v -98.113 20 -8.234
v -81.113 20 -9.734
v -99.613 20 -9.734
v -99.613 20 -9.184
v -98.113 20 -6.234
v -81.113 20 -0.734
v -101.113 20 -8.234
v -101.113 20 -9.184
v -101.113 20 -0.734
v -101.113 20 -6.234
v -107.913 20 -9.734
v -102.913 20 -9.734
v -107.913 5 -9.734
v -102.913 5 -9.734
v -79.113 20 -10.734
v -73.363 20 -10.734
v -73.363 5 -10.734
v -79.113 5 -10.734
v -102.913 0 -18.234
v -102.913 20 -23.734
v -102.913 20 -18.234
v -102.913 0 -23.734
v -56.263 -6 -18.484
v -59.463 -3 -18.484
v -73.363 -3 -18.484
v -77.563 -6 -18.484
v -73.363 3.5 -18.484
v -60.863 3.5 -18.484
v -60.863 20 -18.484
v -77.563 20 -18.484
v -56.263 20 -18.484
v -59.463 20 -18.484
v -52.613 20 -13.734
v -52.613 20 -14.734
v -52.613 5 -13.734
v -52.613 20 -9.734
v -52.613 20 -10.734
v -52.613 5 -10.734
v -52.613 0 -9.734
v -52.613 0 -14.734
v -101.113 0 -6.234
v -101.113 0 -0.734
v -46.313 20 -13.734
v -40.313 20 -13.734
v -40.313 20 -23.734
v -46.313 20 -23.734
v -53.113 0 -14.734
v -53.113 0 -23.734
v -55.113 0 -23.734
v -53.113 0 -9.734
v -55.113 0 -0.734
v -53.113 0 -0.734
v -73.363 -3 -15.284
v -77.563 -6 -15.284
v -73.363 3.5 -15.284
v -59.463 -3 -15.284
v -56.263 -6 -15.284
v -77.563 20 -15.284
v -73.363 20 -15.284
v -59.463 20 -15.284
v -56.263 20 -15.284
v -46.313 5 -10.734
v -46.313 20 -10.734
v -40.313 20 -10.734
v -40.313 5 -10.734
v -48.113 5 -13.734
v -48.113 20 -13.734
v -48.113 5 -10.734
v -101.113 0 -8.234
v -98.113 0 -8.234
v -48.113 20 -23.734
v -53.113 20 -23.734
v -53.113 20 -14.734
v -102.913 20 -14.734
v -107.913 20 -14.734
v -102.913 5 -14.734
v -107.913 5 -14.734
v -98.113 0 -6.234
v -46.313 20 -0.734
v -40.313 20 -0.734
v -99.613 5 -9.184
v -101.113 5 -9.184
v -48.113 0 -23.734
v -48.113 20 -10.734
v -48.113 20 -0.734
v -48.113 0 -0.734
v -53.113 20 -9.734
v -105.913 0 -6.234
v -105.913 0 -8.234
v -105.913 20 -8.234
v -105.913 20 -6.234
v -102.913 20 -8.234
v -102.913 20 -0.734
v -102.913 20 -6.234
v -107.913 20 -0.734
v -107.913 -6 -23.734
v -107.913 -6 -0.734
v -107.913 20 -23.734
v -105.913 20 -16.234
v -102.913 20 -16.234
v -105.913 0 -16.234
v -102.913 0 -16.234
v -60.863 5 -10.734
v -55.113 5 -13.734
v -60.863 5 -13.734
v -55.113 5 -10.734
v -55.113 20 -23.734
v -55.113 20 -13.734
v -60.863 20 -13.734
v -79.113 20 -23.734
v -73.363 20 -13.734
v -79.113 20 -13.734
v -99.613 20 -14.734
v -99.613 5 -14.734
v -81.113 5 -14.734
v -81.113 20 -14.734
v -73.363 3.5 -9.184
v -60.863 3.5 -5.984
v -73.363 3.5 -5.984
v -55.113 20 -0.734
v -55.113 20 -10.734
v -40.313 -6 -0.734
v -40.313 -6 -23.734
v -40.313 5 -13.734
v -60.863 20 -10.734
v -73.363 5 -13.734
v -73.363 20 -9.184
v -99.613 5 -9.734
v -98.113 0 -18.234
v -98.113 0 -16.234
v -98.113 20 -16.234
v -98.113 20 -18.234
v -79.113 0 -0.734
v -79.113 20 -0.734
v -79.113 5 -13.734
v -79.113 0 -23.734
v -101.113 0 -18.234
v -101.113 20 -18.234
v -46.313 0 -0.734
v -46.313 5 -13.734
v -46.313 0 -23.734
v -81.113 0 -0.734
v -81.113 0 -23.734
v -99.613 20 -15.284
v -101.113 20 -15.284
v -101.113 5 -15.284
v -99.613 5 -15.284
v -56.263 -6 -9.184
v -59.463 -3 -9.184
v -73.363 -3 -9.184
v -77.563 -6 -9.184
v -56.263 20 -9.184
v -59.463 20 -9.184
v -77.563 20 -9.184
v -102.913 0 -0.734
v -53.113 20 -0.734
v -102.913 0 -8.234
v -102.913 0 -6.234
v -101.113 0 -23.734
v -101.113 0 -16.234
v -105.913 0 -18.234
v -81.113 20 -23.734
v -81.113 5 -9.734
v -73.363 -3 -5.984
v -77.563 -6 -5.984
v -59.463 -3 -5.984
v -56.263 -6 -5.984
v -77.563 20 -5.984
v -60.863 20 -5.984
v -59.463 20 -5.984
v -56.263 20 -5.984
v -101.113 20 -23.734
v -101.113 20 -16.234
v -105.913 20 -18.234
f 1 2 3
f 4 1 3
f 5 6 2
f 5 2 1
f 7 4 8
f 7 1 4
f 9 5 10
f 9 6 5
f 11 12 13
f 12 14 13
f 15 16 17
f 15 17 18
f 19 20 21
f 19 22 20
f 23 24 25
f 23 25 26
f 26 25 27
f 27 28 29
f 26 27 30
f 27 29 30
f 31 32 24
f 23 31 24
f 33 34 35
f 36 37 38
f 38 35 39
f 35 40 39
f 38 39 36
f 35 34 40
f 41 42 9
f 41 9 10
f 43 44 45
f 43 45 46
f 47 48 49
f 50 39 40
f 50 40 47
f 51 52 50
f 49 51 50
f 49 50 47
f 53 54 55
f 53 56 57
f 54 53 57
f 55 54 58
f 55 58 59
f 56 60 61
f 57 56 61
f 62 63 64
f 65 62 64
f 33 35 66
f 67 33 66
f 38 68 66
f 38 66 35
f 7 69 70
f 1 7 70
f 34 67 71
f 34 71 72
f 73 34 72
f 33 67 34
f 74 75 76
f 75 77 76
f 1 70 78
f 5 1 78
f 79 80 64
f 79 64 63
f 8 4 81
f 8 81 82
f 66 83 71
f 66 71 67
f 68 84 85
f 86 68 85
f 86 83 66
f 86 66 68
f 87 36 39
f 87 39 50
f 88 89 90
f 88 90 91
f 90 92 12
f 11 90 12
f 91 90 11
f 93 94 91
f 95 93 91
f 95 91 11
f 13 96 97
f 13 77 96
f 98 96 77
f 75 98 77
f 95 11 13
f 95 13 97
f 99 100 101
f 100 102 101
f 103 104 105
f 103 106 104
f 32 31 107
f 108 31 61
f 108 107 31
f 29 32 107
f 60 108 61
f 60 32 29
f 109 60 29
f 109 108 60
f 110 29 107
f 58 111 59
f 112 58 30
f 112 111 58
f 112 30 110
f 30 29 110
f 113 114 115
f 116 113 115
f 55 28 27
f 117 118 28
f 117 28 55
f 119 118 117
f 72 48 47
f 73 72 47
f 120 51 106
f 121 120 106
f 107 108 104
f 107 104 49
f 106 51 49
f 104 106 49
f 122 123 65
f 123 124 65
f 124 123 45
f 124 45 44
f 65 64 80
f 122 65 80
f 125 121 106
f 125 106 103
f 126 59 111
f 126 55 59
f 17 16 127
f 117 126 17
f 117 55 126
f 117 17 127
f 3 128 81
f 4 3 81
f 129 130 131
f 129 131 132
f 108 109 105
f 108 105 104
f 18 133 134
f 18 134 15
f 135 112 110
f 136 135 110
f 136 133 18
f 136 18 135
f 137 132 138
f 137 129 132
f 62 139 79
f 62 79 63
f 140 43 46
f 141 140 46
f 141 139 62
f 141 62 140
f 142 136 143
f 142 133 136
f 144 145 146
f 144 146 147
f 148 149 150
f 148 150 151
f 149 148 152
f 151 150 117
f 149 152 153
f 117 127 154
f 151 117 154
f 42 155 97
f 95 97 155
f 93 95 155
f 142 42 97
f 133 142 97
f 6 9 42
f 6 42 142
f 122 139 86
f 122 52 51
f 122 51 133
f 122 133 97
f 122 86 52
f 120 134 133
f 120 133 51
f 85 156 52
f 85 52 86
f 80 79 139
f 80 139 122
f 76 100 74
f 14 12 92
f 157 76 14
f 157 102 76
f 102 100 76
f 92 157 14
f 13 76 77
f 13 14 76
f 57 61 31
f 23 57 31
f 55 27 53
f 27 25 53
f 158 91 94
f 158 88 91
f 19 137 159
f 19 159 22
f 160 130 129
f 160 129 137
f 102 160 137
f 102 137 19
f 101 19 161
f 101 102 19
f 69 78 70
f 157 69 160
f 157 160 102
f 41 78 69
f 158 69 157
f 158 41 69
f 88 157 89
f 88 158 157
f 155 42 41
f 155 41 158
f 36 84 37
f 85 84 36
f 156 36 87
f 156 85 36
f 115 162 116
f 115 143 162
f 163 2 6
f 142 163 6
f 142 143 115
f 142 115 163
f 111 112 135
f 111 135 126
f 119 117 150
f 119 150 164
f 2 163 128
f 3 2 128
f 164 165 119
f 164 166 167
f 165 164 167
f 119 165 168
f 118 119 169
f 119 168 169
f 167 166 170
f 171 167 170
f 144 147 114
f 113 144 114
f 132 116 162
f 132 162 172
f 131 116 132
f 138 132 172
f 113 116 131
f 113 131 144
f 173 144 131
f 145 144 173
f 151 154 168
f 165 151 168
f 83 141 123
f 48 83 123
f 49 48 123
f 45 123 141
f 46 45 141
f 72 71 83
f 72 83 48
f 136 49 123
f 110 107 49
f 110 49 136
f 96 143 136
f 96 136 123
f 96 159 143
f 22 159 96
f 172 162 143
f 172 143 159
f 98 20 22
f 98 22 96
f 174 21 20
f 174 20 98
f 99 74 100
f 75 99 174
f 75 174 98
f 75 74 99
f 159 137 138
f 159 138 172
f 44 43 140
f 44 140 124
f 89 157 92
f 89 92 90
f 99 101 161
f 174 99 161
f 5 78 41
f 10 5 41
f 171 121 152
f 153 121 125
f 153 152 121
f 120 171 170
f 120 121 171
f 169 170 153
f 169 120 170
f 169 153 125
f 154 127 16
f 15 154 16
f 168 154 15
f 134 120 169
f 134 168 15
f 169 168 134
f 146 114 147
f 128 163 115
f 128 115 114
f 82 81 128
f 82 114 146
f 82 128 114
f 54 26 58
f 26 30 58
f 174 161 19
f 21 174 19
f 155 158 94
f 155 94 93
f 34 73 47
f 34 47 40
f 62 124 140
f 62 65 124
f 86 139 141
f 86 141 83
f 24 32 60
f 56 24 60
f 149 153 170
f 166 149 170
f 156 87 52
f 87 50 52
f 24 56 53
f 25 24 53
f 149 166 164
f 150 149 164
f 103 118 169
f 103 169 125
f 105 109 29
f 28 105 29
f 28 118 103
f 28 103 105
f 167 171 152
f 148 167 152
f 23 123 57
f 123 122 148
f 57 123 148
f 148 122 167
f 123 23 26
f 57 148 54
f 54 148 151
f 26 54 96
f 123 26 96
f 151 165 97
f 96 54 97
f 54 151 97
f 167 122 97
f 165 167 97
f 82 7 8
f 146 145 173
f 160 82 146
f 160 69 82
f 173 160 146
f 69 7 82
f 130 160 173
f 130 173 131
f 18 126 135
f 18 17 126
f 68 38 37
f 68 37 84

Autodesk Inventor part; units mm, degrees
ref_plane "YZ Plane" through (0, 0, 0) normal (1, 0, 0) x (0, 1, 0)
ref_plane "XZ Plane" through (0, 0, 0) normal (0, 1, 0) x (-1, 0, 0)
ref_plane "XY Plane" through (0, 0, 0) normal (0, 0, 1) x (1, 0, 0)
sketch "Sketch1" plane through (0, 0, 0) normal (0, 1, 0) x (-1, 0, 0)
  line L0 (73.3629, -5.9836) -> (60.8629, -5.9836)
  line L1 (60.8629, -5.9836) -> (60.8629, -18.4836)
  line L2 (60.8629, -18.4836) -> (73.3629, -18.4836)
  line L3 (73.3629, -18.4836) -> (73.3629, -5.9836)
  line L4 (107.9129, -0.7336) -> (40.3129, -0.7336)
  line L5 (40.3129, -23.7336) -> (107.9129, -23.7336)
  line L6 (77.3838, -12.2336) -> (49.3838, -12.2336) construction
  line L7 (67.1129, -2.25) -> (67.1129, -23.25) construction
  line L8 (81.1129, -9.7336) -> (107.9129, -9.7336)
  line L9 (107.9129, -14.7336) -> (81.1129, -14.7336)
  line L10 (48.1129, -23.7336) -> (48.1129, -0.7336)
  line L11 (46.3129, -0.7336) -> (46.3129, -23.7336)
  line L12 (52.6129, -10.7336) -> (40.3129, -10.7336)
  line L13 (52.6129, -13.7336) -> (40.3129, -13.7336)
  line L14 (101.1129, -15.2836) -> (99.6129, -15.2836)
  line L15 (99.6129, -15.2836) -> (99.6129, -9.1836)
  line L16 (99.6129, -9.1836) -> (101.1129, -9.1836)
  line L17 (79.1129, -0.7336) -> (79.1129, -23.7336)
  line L18 (81.1129, -23.7336) -> (81.1129, -0.7336)
  line L19 (55.1129, -0.7336) -> (55.1129, -23.7336)
  line L20 (79.1129, -13.7336) -> (73.3629, -13.7336)
  line L21 (73.3629, -10.7336) -> (79.1129, -10.7336)
  line L22 (60.8629, -13.7336) -> (55.1129, -13.7336)
  line L23 (55.1129, -10.7336) -> (60.8629, -10.7336)
  line L24 (73.3629, -18.4836) -> (77.5629, -18.4836)
  line L25 (77.5629, -18.4836) -> (77.5629, -15.2836)
  line L26 (77.5629, -15.2836) -> (73.3629, -15.2836)
  line L27 (73.3629, -15.2836) -> (60.8629, -15.2836)
  line L28 (56.2629, -15.2836) -> (56.2629, -18.4836)
  line L29 (56.2629, -18.4836) -> (59.4629, -18.4836)
  line L30 (59.4629, -15.2836) -> (56.2629, -15.2836)
  line L31 (59.4629, -5.9836) -> (56.2629, -5.9836)
  line L32 (56.2629, -5.9836) -> (56.2629, -9.1836)
  line L33 (56.2629, -9.1836) -> (59.4629, -9.1836)
  line L34 (60.8629, -9.1836) -> (73.3629, -9.1836)
  line L35 (77.5629, -9.1836) -> (77.5629, -5.9836)
  line L36 (73.3629, -5.9836) -> (77.5629, -5.9836)
  line L37 (77.5629, -9.1836) -> (73.3629, -9.1836)
  line L38 (59.4629, -18.4836) -> (59.4629, -15.2836)
  line L39 (59.4629, -9.1836) -> (59.4629, -5.9836)
  line L40 (60.8629, -18.4836) -> (59.4629, -18.4836)
  line L41 (60.8629, -15.2836) -> (59.4629, -15.2836)
  line L42 (60.8629, -9.1836) -> (59.4629, -9.1836)
  line L43 (60.8629, -5.9836) -> (59.4629, -5.9836)
  line L44 (40.3129, -23.7336) -> (40.3129, -0.7336)
  line L45 (107.9129, -23.7336) -> (107.9129, -0.7336)
  line L46 (53.1129, -14.7336) -> (52.6129, -14.7336)
  line L47 (52.6129, -14.7336) -> (52.6129, -9.7336)
  line L48 (52.6129, -9.7336) -> (53.1129, -9.7336)
  line L49 (53.1129, -23.7336) -> (53.1129, -14.7336)
  line L50 (53.1129, -9.7336) -> (53.1129, -0.7336)
  line L51 (101.1129, -16.2336) -> (98.1129, -16.2336)
  line L52 (98.1129, -16.2336) -> (98.1129, -18.2336)
  line L53 (98.1129, -18.2336) -> (101.1129, -18.2336)
  line L54 (102.9129, -16.2336) -> (105.9129, -16.2336)
  line L55 (105.9129, -16.2336) -> (105.9129, -18.2336)
  line L56 (105.9129, -18.2336) -> (102.9129, -18.2336)
  line L57 (101.1129, -8.2336) -> (98.1129, -8.2336)
  line L58 (98.1129, -8.2336) -> (98.1129, -6.2336)
  line L59 (98.1129, -6.2336) -> (101.1129, -6.2336)
  line L60 (102.9129, -8.2336) -> (105.9129, -8.2336)
  line L61 (105.9129, -8.2336) -> (105.9129, -6.2336)
  line L62 (105.9129, -6.2336) -> (102.9129, -6.2336)
  line L63 (106.4404, -17.2336) -> (97.7013, -17.2336) construction
  line L64 (106, -7.2336) -> (98, -7.2336) construction
  line L65 (102.9129, -23.7336) -> (102.9129, -18.2336)
  line L66 (101.1129, -18.2336) -> (101.1129, -23.7336)
  line L67 (102.9129, -16.2336) -> (102.9129, -8.2336)
  line L68 (102.9129, -6.2336) -> (102.9129, -0.7336)
  line L69 (101.1129, -0.7336) -> (101.1129, -6.2336)
  line L70 (101.1129, -8.2336) -> (101.1129, -16.2336)
  point P0 (102.9129, -9.7336)
  point P1 (101.1129, -9.7336)
  point P2 (102.9129, -14.7336)
  point P3 (101.1129, -14.7336)
  point P4 (48.1129, -10.7336)
  point P5 (46.3129, -10.7336)
  point P6 (48.1129, -13.7336)
  point P7 (46.3129, -13.7336)
  point P8 (67.1129, -12.2336)
  point P9 (99.6129, -9.7336)
  point P10 (99.6129, -14.7336)
  dimension "d0" = 12.5
  dimension "d1" = 12.5
  dimension "d12" = 5
  dimension "d18" = 1.8
  dimension "d39" = 1.5
  dimension "d43" = 2
  dimension "d52" = 12
  dimension "d57" = 12
  dimension "d62" = 3
  dimension "d63" = 3
  dimension "d71" = 7
  dimension "d76" = 4.2
  dimension "d77" = 3.2
  dimension "d78" = 3.2
  dimension "d79" = 1.4
  dimension "d80" = 3.2
  dimension "d91" = 6
  dimension "d92" = 3
  dimension "d95" = 23
  dimension "d98" = 5
  dimension "d99" = 0.5
  dimension "d100" = 2
  dimension "d101" = 2
  dimension "d102" = 3
  dimension "d103" = 10
  dimension "d104" = 1.8
  dimension "d105" = 20
  dimension "d107" = 6.1
  dimension "d108" = 5
  dimension "d109" = 67.6
extrude "Extrusion11" add sketch "Sketch1" against normal blind 3 contours L3 L34 L1 L0 | L1 L42 L39 L43 | L3 L2 L1 L27 | L1 L40 L38 L41
extrude "Extrusion10" add sketch "Sketch1" against normal blind 6 separate body contours L0 L43 L31 L32 L33 L42 L1 L23 L19 L4 L17 L21 L3 L37 L35 L36 | L3 L27 L1 L34 | L21 L17 L20 L3 | L1 L22 L19 L23 | L20 L17 L5 L19 L22 L1 L41 L30 L28 L29 L40 L2 L24 L25 L26 L3 | L17 L4 L18 L5 | L19 L5 L49 L46 L47 L48 L50 L4 | L4 L69 L59 L58 L57 L70 L16 L15 L8 L18 | L50 L48 L47 L12 L10 L4 | L18 L9 L15 L14 L70 L51 L52 L53 L66 L5 | L4 L68 L62 L61 L60 L67 L8 L70 L57 L58 L59 L69 | L8 L15 L9 L18 | L5 L10 L13 L47 L46 L49 | L10 L12 L11 L4 | L66 L53 L52 L51 L70 L9 L67 L54 L55 L56 L65 L5 | L4 L45 L8 L67 L60 L61 L62 L68 | L15 L16 L70 L8 | L8 L70 L9 L15 | L5 L11 L13 L10 | L11 L12 L44 L4 | L12 L47 L13 L10 | L10 L13 L11 L12 | L65 L56 L55 L54 L67 L9 L45 L5 | L9 L70 L14 L15 | L8 L67 L9 L70 | L5 L44 L13 L11 | L11 L13 L44 L12 | L45 L9 L67 L8
extrude "Extrusion15" add sketch "Sketch1" along normal blind 5 contours L0 L43 L31 L32 L33 L42 L1 L23 L19 L4 L17 L21 L3 L37 L35 L36 | L21 L17 L20 L3 | L1 L22 L19 L23 | L20 L17 L5 L19 L22 L1 L41 L30 L28 L29 L40 L2 L24 L25 L26 L3 | L4 L69 L59 L58 L57 L70 L16 L15 L8 L18 | L50 L48 L47 L12 L10 L4 | L18 L9 L15 L14 L70 L51 L52 L53 L66 L5 | L8 L15 L9 L18 | L5 L10 L13 L47 L46 L49 | L4 L45 L8 L67 L60 L61 L62 L68 | L15 L16 L70 L8 | L8 L70 L9 L15 | L11 L12 L44 L4 | L12 L47 L13 L10 | L65 L56 L55 L54 L67 L9 L45 L5 | L9 L70 L14 L15 | L5 L44 L13 L11 | L11 L13 L44 L12 | L45 L9 L67 L8
extrude "Extrusion14" add sketch "Sketch1" along normal blind 3.5 contours L3 L34 L1 L0 | L3 L27 L1 L34 | L3 L2 L1 L27
extrude "Extrusion16" add sketch "Sketch1" along normal blind 20 contours L0 L43 L31 L32 L33 L42 L1 L23 L19 L4 L17 L21 L3 L37 L35 L36 | L1 L42 L39 L43 | L20 L17 L5 L19 L22 L1 L41 L30 L28 L29 L40 L2 L24 L25 L26 L3 | L1 L40 L38 L41 | L4 L69 L59 L58 L57 L70 L16 L15 L8 L18 | L50 L48 L47 L12 L10 L4 | L18 L9 L15 L14 L70 L51 L52 L53 L66 L5 | L5 L10 L13 L47 L46 L49 | L4 L45 L8 L67 L60 L61 L62 L68 | L11 L12 L44 L4 | L65 L56 L55 L54 L67 L9 L45 L5 | L5 L44 L13 L11
properties part number "Spirulina_prototype"
